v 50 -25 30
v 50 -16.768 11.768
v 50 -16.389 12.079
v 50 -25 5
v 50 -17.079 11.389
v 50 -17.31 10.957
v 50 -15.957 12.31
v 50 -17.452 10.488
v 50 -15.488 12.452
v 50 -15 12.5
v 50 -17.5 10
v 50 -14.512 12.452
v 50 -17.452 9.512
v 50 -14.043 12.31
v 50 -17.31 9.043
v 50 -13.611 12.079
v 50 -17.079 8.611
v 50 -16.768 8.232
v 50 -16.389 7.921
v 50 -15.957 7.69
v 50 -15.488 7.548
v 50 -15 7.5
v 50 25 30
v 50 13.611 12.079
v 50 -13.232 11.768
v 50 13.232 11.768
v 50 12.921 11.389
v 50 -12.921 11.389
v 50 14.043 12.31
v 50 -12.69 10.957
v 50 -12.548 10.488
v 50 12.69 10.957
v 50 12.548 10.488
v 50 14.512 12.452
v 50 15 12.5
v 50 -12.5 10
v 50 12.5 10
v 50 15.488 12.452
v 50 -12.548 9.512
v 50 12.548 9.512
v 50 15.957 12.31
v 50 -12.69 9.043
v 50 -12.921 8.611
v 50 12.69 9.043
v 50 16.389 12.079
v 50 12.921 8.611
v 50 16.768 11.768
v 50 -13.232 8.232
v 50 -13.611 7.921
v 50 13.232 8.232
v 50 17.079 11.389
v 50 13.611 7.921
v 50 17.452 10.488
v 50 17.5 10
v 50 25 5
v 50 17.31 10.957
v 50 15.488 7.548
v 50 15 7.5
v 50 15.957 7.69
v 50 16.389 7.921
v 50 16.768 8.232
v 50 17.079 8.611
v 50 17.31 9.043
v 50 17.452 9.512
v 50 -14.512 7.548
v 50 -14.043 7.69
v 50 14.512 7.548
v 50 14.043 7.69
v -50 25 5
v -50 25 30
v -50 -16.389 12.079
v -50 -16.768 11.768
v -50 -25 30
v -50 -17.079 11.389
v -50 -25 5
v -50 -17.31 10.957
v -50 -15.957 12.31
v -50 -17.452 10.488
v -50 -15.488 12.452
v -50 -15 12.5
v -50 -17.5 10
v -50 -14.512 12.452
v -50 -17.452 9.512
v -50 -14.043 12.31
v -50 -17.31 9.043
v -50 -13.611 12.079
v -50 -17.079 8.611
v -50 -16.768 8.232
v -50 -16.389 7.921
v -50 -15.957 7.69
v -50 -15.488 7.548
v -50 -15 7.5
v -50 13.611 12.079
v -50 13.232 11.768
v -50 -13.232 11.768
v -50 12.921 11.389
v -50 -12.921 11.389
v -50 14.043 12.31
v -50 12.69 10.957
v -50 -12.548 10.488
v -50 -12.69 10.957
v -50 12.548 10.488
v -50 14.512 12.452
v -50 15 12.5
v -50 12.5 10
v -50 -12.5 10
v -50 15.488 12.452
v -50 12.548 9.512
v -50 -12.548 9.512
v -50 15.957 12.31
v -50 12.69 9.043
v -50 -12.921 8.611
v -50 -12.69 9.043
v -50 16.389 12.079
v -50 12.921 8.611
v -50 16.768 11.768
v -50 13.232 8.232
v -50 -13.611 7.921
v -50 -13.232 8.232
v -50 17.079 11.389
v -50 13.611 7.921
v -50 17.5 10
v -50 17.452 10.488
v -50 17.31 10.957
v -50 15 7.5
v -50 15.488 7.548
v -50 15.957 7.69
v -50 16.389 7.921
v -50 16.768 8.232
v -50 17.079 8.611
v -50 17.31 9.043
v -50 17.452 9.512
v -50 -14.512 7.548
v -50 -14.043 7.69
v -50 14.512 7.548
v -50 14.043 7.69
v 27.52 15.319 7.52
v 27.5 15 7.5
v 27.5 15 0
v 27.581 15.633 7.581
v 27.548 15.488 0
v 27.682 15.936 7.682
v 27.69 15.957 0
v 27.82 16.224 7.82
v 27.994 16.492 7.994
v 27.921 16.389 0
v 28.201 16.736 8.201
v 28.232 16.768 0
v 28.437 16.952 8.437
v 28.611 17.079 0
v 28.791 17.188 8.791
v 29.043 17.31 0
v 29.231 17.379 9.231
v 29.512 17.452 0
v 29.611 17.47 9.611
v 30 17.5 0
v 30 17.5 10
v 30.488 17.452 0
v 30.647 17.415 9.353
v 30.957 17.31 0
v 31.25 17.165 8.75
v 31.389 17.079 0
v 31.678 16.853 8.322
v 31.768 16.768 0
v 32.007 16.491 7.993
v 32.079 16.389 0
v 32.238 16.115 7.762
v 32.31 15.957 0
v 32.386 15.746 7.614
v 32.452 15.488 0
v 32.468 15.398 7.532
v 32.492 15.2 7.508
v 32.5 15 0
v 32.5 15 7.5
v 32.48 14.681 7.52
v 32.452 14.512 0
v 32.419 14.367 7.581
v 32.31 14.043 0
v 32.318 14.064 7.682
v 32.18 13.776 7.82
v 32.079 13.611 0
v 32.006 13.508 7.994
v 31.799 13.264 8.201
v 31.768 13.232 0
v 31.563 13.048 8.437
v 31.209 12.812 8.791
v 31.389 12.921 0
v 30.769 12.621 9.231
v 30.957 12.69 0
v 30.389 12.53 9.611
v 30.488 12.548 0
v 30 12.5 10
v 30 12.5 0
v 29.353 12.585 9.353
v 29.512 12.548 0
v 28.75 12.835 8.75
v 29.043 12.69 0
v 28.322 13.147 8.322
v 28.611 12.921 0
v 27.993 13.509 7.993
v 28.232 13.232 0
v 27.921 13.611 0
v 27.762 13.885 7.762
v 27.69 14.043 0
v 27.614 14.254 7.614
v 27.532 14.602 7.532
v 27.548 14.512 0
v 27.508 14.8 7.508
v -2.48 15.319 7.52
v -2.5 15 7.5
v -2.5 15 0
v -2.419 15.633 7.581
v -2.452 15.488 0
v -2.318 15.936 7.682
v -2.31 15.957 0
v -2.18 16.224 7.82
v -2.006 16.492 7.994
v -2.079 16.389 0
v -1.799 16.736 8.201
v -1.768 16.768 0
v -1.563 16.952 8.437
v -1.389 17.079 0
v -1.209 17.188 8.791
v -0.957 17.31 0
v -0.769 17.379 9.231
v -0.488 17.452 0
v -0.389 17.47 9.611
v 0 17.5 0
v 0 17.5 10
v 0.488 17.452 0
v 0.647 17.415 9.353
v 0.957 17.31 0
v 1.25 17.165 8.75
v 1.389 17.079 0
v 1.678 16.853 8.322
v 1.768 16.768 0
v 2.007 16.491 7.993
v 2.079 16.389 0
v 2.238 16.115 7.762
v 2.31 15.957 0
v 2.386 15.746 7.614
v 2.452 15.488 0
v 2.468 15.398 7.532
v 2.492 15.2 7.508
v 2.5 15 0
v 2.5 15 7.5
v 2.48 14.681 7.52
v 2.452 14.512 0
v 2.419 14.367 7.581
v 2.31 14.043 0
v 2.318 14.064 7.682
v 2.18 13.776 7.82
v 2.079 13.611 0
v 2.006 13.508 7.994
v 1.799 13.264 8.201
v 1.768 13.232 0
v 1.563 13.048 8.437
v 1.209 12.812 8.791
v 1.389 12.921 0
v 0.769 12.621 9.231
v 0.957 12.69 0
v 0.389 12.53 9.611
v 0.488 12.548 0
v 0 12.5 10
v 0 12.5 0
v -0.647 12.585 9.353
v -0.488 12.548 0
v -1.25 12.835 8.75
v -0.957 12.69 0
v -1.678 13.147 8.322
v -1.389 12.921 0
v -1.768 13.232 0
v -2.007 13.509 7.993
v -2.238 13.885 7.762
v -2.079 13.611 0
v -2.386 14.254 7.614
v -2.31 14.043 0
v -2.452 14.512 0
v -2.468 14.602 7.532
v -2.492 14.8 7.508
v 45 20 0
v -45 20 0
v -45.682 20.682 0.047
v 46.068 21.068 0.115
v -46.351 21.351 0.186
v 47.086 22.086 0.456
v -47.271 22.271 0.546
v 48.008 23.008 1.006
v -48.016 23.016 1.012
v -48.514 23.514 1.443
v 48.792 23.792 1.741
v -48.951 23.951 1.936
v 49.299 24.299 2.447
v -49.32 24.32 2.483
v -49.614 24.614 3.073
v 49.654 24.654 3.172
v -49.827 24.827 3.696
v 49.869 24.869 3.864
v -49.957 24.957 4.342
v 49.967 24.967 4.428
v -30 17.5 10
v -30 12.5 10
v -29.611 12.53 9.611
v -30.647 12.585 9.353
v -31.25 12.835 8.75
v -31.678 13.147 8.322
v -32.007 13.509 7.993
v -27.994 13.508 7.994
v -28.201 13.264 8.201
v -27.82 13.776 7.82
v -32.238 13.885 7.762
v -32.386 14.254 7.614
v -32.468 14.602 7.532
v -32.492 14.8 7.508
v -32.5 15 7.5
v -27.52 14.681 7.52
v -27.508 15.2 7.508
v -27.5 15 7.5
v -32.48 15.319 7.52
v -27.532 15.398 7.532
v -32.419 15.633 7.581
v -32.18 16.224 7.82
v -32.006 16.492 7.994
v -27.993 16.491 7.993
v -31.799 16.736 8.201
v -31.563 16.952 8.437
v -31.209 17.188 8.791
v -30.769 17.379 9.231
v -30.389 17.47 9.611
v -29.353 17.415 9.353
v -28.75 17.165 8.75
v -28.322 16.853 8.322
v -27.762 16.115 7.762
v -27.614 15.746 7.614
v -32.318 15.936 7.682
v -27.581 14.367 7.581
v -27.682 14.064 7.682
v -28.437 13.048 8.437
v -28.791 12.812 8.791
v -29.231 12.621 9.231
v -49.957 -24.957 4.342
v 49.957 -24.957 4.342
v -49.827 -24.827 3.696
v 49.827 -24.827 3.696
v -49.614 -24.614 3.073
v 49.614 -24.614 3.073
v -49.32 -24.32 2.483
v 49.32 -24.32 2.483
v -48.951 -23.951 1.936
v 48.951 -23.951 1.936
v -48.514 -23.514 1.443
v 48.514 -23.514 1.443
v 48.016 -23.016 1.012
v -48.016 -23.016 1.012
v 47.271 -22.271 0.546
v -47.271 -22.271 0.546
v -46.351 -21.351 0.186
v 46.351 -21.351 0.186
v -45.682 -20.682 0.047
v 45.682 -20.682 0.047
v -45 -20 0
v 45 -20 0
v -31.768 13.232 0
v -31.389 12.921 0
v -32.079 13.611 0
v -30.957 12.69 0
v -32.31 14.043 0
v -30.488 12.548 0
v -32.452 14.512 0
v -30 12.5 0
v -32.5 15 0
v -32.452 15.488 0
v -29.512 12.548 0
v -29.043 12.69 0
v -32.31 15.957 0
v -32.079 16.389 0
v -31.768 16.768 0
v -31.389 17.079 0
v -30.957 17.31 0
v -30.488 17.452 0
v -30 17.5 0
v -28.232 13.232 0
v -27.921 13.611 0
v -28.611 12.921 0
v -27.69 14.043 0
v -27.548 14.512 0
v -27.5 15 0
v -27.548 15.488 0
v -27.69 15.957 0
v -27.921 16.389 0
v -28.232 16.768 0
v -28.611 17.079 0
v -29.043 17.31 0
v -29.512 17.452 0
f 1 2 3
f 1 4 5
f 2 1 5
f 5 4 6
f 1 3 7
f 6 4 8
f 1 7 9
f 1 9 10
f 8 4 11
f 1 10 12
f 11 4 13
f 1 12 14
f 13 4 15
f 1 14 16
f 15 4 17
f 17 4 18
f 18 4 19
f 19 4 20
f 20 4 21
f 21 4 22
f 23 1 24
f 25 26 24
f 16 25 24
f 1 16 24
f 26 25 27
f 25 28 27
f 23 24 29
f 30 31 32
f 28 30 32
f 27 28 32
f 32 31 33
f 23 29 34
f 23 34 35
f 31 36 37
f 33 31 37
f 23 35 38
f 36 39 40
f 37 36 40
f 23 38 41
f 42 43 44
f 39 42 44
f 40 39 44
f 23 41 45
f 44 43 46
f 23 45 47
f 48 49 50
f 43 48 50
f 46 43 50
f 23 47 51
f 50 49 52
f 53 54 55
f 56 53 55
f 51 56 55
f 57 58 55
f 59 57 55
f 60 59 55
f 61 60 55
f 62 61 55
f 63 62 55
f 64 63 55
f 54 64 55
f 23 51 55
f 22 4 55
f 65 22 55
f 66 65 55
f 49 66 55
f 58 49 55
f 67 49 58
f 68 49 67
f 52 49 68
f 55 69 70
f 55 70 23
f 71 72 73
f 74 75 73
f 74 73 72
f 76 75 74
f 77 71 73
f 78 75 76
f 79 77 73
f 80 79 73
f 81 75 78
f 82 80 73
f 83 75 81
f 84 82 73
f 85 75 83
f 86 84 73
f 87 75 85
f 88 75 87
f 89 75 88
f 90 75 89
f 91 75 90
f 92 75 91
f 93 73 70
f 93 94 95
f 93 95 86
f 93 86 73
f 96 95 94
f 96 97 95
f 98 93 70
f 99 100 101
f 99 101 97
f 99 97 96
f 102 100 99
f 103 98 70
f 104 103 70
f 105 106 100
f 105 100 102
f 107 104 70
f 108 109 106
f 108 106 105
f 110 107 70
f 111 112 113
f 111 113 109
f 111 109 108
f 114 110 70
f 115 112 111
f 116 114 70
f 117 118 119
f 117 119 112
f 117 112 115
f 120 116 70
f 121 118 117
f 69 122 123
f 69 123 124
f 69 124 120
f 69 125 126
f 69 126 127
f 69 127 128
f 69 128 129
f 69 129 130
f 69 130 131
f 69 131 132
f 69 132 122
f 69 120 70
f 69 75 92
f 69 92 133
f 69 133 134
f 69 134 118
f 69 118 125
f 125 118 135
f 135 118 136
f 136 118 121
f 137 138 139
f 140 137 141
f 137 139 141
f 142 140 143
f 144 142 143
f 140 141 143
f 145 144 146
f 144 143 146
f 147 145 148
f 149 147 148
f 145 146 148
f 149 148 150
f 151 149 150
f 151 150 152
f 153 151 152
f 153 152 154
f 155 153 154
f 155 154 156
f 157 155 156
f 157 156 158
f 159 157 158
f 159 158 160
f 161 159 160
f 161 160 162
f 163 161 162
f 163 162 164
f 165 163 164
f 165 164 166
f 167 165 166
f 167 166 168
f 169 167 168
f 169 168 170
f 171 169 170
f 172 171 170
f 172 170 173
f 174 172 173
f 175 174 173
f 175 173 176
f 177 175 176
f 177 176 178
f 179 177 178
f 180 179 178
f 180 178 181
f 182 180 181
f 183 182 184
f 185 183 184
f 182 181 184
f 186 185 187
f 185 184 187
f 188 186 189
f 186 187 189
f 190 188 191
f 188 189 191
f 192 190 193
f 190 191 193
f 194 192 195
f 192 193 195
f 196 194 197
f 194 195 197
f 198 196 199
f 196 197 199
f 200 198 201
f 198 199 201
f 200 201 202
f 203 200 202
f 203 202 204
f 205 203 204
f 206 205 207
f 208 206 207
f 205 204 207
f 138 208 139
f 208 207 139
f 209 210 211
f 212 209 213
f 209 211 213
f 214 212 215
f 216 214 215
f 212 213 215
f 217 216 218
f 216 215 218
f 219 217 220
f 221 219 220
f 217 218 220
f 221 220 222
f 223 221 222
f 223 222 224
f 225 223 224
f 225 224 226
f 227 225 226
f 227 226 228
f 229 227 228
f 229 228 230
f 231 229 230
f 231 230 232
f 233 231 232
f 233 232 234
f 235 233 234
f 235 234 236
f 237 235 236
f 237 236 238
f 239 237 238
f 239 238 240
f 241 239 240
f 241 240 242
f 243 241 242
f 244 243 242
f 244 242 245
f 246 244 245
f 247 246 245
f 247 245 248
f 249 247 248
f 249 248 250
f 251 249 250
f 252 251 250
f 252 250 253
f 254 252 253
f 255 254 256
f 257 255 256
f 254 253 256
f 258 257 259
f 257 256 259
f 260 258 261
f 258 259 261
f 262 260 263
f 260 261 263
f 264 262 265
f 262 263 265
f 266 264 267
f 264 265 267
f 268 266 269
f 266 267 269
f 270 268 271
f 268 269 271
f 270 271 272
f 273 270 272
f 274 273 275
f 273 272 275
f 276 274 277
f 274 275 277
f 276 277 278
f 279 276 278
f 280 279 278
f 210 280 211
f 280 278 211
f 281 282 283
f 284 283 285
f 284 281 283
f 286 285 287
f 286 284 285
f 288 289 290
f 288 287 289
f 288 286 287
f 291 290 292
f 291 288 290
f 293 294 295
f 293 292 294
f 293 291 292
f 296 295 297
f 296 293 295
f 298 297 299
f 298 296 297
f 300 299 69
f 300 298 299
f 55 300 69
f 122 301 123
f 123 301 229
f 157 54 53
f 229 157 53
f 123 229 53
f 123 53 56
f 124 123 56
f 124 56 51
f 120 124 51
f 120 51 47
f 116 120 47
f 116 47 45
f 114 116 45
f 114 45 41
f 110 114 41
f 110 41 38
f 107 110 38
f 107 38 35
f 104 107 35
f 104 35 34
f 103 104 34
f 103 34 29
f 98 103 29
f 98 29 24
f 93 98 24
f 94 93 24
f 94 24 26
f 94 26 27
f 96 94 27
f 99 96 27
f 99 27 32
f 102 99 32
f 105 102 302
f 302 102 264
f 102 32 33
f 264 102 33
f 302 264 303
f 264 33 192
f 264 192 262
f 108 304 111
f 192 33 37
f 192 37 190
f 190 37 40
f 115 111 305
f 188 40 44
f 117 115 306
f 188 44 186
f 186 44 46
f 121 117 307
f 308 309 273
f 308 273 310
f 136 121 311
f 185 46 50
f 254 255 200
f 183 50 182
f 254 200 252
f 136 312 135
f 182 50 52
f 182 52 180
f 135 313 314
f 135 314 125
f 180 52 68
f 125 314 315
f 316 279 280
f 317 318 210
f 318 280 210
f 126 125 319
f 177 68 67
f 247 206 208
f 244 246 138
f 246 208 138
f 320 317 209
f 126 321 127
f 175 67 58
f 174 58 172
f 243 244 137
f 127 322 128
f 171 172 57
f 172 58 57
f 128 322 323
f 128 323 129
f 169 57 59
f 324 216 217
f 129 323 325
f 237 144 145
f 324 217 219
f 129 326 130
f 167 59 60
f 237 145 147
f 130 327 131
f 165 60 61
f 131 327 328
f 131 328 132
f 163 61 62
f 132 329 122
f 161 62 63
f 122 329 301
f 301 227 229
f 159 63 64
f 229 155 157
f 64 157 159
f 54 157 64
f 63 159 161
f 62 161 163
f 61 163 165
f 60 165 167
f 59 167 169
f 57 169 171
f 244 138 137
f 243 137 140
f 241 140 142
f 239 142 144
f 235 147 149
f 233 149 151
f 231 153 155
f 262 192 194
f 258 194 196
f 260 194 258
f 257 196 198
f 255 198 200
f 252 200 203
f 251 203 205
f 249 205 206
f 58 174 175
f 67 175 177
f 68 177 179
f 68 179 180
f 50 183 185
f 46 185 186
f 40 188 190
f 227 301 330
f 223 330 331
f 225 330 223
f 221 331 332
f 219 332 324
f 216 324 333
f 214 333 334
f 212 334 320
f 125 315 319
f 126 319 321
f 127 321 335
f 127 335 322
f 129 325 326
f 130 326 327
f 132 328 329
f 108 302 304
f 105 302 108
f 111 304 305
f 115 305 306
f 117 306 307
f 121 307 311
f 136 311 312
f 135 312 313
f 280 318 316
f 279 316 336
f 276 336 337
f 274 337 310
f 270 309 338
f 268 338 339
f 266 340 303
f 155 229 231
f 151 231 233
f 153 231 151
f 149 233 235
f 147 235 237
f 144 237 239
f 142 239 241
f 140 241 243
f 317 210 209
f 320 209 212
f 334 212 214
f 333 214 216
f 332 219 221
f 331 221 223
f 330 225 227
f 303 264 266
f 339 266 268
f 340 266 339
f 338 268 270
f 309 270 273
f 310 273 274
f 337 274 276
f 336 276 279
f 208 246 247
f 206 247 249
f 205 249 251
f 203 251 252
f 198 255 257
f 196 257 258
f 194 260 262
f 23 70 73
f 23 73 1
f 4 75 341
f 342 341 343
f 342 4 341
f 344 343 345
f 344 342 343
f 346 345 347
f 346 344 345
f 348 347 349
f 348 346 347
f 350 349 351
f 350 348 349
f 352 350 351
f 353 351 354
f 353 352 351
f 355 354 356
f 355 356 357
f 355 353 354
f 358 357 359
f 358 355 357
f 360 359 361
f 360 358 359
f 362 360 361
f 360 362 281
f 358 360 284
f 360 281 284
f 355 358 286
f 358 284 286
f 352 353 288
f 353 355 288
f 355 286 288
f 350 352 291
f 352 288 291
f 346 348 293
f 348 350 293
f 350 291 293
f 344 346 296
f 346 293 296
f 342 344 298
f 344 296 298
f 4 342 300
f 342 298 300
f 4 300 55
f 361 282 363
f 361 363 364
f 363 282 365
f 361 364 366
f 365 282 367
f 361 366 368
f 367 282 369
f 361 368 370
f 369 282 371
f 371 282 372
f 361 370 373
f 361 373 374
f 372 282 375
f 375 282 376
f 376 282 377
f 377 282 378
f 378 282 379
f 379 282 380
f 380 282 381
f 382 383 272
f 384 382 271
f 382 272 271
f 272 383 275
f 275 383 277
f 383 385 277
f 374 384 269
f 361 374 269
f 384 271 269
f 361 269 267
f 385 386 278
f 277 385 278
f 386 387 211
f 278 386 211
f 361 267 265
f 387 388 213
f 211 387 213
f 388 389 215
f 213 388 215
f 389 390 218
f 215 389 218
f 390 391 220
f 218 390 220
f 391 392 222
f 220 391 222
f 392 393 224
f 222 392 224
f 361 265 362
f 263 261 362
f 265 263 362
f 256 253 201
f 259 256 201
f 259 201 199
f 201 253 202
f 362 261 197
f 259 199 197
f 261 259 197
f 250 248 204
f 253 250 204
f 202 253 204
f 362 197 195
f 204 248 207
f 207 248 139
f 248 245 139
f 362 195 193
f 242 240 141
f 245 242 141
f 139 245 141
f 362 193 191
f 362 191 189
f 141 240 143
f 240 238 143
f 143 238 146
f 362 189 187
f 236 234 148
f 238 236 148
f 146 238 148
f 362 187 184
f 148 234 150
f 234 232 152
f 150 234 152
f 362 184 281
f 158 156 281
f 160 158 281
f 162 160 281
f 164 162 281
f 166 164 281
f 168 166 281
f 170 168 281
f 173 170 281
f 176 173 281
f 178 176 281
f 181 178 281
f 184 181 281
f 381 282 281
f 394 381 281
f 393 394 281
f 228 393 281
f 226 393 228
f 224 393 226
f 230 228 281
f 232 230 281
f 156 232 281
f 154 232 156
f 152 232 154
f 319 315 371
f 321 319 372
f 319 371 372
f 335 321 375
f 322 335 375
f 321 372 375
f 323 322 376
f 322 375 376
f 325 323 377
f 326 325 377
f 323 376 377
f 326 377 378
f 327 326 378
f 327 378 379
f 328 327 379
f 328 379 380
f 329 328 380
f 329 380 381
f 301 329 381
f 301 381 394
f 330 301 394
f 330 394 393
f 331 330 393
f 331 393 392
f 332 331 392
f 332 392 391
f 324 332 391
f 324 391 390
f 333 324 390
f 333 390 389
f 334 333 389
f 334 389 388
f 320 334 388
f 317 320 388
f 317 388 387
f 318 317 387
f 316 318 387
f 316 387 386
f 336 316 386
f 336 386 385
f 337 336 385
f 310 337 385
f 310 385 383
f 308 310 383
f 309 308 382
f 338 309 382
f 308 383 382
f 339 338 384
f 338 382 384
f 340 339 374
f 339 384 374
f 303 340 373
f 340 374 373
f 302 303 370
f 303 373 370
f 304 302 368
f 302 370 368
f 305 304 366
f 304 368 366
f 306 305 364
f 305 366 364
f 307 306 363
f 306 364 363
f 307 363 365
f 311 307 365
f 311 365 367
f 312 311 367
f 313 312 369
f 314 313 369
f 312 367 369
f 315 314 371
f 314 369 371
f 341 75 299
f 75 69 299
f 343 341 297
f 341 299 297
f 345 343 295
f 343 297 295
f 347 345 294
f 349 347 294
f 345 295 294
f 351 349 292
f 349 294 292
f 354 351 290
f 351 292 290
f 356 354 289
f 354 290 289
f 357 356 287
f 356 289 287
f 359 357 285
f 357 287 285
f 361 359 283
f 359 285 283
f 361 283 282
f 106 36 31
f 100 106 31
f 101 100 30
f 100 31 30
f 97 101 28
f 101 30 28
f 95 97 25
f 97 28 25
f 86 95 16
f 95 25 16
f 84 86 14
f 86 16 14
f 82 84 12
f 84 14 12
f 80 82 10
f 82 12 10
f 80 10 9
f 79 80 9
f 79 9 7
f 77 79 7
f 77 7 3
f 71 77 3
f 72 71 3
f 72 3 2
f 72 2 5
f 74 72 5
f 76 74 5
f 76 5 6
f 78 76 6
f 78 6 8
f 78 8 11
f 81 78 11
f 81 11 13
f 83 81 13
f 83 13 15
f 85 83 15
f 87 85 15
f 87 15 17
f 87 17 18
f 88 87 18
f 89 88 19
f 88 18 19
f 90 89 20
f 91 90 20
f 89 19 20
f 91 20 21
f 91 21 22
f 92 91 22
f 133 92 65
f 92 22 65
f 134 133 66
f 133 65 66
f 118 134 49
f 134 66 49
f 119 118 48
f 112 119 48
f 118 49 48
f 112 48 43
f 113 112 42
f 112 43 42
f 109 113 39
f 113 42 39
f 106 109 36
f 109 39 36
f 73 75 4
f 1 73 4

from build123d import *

# Parameters (mm, degrees)
SKETCH1_W               = 100
SKETCH1_H               = 50
BOSS_EXTRUDE1_DEPTH     = 30
SKETCH2_R               = 2.5
CUT_EXTRUDE1_DEPTH      = 108.354552768
FILLET1_R               = 5
CUT_EXTRUDE2_REACH      = 65.443
CUT_EXTRUDE2_END_RADIUS = 2.5
SKETCH3_R               = 2.5


with BuildPart() as part:
    # Sketch1 → Boss-Extrude1 (new body)
    with BuildSketch(Plane.XY):
        Rectangle(SKETCH1_W, SKETCH1_H)
    extrude(amount=BOSS_EXTRUDE1_DEPTH)

    # Sketch2 → Cut-Extrude1 (cut, through all)
    with BuildSketch(Plane(origin=(50, 0, 0), x_dir=(0, 0, -1), z_dir=(1, 0, 0))):
        with Locations(Location((-10, 15, 0), (0, 0, 90))):
            Circle(SKETCH2_R)
        with Locations(Location((-10, -15, 0), (0, 0, 90))):
            Circle(SKETCH2_R)
    extrude(amount=-CUT_EXTRUDE1_DEPTH, mode=Mode.SUBTRACT)

    # Fillet1
    fillet1_edges = [part.edges().sort_by_distance(p)[0] for p in [
        (0, -25, 0),
        (-50, 0, 0),
        (0, 25, 0),
        (50, 0, 0),
    ]]
    fillet(fillet1_edges, radius=FILLET1_R)

    # Cut-Extrude2: up to this cylinder (the profile starts outside it)
    cut_extrude2_end = Plane(origin=(0, 15, 10), z_dir=(1, 0, 0)) * Cylinder(CUT_EXTRUDE2_END_RADIUS, 196.886, mode=Mode.PRIVATE)
    # Sketch3 → Cut-Extrude2 (cut, up to the surface)
    with BuildSketch(Plane(origin=(0, 0, 0), x_dir=(-1, 0, 0), z_dir=(0, 0, -1)), mode=Mode.PRIVATE) as cut_extrude2_sk1:
        with Locations((-30, 15)):
            Circle(SKETCH3_R)
    cut_extrude2_tool1 = extrude(cut_extrude2_sk1.sketch, amount=-CUT_EXTRUDE2_REACH, mode=Mode.PRIVATE) - cut_extrude2_end
    add(cut_extrude2_tool1.solids().sort_by_distance((30, 15, 0))[0], mode=Mode.SUBTRACT)
    # Sketch3 → Cut-Extrude2 (cut, up to the surface)
    with BuildSketch(Plane(origin=(0, 0, 0), x_dir=(-1, 0, 0), z_dir=(0, 0, -1)), mode=Mode.PRIVATE) as cut_extrude2_sk2:
        with Locations((30, 15)):
            Circle(SKETCH3_R)
    cut_extrude2_tool2 = extrude(cut_extrude2_sk2.sketch, amount=-CUT_EXTRUDE2_REACH, mode=Mode.PRIVATE) - cut_extrude2_end
    add(cut_extrude2_tool2.solids().sort_by_distance((-30, 15, 0))[0], mode=Mode.SUBTRACT)
    # Sketch3 → Cut-Extrude2 (cut, up to the surface)
    with BuildSketch(Plane(origin=(0, 0, 0), x_dir=(-1, 0, 0), z_dir=(0, 0, -1)), mode=Mode.PRIVATE) as cut_extrude2_sk3:
        with Locations((0, 15)):
            Circle(SKETCH3_R)
    cut_extrude2_tool3 = extrude(cut_extrude2_sk3.sketch, amount=-CUT_EXTRUDE2_REACH, mode=Mode.PRIVATE) - cut_extrude2_end
    add(cut_extrude2_tool3.solids().sort_by_distance((0, 15, 0))[0], mode=Mode.SUBTRACT)


solid = part.part
